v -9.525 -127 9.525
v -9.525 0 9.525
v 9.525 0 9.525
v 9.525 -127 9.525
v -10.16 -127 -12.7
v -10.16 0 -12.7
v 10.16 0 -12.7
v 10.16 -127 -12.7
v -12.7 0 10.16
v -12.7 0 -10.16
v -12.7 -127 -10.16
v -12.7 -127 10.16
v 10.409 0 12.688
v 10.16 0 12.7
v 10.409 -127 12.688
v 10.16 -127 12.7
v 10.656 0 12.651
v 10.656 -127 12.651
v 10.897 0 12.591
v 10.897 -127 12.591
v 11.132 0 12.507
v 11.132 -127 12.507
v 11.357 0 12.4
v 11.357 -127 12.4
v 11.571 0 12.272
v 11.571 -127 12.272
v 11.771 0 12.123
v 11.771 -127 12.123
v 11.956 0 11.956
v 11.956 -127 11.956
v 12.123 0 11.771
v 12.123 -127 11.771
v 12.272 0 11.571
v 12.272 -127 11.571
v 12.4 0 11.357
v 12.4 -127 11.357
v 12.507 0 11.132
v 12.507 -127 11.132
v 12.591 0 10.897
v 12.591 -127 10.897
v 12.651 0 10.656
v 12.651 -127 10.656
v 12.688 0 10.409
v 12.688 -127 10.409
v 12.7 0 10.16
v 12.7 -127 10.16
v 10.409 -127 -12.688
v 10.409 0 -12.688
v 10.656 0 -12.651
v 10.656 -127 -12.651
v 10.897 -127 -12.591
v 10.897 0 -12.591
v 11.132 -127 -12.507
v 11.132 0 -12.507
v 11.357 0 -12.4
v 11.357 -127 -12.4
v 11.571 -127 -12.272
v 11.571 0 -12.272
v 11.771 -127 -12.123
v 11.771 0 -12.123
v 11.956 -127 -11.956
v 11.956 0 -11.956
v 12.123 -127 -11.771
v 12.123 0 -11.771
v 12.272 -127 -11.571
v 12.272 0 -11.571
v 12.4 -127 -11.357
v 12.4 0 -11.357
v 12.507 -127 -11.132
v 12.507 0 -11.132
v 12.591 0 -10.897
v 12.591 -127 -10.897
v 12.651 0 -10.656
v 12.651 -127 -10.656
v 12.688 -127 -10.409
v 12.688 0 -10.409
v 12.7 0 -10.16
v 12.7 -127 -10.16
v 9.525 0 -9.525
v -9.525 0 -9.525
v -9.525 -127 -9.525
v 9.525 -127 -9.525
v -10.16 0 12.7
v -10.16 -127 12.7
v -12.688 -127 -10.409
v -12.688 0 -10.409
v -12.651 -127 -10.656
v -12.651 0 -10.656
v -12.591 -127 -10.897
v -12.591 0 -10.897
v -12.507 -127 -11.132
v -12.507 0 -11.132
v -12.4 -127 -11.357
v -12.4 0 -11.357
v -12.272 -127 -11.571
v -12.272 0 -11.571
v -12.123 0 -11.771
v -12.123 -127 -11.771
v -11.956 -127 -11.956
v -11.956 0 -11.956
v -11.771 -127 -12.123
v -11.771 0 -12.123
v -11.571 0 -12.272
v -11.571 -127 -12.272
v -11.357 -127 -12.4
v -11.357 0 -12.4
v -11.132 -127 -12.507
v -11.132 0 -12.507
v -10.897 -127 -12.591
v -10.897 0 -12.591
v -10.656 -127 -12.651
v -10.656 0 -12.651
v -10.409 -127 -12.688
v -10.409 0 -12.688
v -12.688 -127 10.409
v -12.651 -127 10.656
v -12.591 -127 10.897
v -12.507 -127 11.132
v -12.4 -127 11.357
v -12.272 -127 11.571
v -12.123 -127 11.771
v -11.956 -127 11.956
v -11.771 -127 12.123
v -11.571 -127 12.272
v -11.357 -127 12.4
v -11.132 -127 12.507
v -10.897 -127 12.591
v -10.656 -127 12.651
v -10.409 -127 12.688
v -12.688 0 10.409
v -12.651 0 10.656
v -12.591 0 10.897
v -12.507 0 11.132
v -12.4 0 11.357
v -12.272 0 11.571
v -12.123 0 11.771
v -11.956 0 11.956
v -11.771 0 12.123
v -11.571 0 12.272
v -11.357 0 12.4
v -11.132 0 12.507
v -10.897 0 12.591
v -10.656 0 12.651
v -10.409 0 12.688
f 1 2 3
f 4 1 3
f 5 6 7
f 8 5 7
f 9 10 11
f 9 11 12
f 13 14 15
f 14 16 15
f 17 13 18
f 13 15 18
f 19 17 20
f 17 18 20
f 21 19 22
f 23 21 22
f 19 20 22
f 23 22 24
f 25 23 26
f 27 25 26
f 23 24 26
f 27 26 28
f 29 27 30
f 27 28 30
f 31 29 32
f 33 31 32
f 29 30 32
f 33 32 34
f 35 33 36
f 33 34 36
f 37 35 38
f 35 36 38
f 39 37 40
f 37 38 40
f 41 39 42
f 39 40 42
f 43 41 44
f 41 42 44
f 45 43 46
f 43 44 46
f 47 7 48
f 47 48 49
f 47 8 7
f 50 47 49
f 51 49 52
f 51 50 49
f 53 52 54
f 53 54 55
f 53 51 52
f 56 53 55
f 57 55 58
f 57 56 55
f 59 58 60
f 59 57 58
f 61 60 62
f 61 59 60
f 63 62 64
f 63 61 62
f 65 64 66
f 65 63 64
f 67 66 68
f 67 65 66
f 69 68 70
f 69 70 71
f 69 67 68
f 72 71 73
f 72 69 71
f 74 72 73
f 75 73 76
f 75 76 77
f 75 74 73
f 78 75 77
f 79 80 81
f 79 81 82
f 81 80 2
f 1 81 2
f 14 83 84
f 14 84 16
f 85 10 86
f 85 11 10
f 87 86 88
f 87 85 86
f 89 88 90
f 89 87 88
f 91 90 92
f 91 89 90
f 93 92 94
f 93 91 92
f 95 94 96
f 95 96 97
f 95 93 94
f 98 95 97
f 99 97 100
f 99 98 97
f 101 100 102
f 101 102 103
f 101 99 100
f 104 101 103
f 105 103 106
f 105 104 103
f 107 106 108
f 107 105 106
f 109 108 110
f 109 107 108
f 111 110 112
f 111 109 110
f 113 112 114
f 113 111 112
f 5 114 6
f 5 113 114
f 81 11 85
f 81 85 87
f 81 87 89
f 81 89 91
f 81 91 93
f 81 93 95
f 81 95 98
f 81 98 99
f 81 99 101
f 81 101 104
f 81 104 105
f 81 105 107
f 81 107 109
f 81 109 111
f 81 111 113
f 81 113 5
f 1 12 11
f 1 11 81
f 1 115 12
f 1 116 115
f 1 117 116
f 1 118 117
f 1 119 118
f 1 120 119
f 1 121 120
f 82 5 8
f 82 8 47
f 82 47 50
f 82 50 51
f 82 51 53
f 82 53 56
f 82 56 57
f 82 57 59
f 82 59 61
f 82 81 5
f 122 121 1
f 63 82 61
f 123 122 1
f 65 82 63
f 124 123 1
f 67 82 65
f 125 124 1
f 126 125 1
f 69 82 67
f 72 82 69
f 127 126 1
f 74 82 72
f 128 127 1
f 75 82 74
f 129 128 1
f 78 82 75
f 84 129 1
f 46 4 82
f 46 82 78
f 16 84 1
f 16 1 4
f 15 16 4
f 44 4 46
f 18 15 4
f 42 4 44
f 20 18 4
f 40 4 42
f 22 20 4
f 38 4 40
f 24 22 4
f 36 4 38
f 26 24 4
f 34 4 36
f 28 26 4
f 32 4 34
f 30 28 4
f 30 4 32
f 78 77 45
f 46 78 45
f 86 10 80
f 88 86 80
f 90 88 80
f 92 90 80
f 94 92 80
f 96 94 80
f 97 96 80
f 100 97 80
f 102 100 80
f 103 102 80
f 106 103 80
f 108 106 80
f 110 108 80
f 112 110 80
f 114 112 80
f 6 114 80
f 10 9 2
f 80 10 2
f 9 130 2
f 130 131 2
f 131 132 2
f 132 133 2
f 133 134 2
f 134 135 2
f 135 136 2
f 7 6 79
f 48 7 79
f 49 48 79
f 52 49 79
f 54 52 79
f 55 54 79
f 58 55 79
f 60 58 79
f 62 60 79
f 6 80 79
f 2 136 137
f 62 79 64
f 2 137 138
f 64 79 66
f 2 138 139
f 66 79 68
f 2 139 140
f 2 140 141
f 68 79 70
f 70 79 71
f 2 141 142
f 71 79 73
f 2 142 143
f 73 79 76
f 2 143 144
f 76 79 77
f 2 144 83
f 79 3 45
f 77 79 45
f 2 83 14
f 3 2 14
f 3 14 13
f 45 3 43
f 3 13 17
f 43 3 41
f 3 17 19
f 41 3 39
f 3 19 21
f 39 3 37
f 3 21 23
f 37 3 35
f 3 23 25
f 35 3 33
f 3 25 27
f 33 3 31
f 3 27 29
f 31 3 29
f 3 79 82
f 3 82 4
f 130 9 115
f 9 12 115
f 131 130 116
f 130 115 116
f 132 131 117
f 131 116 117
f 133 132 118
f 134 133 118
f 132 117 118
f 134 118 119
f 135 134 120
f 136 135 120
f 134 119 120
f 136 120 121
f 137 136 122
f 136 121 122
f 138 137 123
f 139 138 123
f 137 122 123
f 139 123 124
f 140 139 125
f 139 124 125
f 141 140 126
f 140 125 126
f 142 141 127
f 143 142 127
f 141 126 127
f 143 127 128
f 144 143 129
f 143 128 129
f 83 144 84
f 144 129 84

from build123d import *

# Parameters (mm, degrees)
F0_W     = 25.4
F0_H     = 25.4
F0_W_2   = 19.05
F0_H_2   = 19.05
F1_DEPTH = 127
F2_R     = 2.54


with BuildPart() as f1:
    # F0 (on Front) → F1 (new body)
    with BuildSketch(Plane.XZ):
        Rectangle(F0_W, F0_H)
        Rectangle(F0_W_2, F0_H_2, mode=Mode.SUBTRACT)
    extrude(amount=F1_DEPTH)

    # F2
    f2_edges = [f1.edges().sort_by_distance(p)[0] for p in [
        (-12.7, -63.5, -12.7),
        (12.7, -63.5, -12.7),
        (-12.7, -63.5, 12.7),
        (12.7, -63.5, 12.7),
    ]]
    fillet(f2_edges, radius=F2_R)


solid = f1.part
